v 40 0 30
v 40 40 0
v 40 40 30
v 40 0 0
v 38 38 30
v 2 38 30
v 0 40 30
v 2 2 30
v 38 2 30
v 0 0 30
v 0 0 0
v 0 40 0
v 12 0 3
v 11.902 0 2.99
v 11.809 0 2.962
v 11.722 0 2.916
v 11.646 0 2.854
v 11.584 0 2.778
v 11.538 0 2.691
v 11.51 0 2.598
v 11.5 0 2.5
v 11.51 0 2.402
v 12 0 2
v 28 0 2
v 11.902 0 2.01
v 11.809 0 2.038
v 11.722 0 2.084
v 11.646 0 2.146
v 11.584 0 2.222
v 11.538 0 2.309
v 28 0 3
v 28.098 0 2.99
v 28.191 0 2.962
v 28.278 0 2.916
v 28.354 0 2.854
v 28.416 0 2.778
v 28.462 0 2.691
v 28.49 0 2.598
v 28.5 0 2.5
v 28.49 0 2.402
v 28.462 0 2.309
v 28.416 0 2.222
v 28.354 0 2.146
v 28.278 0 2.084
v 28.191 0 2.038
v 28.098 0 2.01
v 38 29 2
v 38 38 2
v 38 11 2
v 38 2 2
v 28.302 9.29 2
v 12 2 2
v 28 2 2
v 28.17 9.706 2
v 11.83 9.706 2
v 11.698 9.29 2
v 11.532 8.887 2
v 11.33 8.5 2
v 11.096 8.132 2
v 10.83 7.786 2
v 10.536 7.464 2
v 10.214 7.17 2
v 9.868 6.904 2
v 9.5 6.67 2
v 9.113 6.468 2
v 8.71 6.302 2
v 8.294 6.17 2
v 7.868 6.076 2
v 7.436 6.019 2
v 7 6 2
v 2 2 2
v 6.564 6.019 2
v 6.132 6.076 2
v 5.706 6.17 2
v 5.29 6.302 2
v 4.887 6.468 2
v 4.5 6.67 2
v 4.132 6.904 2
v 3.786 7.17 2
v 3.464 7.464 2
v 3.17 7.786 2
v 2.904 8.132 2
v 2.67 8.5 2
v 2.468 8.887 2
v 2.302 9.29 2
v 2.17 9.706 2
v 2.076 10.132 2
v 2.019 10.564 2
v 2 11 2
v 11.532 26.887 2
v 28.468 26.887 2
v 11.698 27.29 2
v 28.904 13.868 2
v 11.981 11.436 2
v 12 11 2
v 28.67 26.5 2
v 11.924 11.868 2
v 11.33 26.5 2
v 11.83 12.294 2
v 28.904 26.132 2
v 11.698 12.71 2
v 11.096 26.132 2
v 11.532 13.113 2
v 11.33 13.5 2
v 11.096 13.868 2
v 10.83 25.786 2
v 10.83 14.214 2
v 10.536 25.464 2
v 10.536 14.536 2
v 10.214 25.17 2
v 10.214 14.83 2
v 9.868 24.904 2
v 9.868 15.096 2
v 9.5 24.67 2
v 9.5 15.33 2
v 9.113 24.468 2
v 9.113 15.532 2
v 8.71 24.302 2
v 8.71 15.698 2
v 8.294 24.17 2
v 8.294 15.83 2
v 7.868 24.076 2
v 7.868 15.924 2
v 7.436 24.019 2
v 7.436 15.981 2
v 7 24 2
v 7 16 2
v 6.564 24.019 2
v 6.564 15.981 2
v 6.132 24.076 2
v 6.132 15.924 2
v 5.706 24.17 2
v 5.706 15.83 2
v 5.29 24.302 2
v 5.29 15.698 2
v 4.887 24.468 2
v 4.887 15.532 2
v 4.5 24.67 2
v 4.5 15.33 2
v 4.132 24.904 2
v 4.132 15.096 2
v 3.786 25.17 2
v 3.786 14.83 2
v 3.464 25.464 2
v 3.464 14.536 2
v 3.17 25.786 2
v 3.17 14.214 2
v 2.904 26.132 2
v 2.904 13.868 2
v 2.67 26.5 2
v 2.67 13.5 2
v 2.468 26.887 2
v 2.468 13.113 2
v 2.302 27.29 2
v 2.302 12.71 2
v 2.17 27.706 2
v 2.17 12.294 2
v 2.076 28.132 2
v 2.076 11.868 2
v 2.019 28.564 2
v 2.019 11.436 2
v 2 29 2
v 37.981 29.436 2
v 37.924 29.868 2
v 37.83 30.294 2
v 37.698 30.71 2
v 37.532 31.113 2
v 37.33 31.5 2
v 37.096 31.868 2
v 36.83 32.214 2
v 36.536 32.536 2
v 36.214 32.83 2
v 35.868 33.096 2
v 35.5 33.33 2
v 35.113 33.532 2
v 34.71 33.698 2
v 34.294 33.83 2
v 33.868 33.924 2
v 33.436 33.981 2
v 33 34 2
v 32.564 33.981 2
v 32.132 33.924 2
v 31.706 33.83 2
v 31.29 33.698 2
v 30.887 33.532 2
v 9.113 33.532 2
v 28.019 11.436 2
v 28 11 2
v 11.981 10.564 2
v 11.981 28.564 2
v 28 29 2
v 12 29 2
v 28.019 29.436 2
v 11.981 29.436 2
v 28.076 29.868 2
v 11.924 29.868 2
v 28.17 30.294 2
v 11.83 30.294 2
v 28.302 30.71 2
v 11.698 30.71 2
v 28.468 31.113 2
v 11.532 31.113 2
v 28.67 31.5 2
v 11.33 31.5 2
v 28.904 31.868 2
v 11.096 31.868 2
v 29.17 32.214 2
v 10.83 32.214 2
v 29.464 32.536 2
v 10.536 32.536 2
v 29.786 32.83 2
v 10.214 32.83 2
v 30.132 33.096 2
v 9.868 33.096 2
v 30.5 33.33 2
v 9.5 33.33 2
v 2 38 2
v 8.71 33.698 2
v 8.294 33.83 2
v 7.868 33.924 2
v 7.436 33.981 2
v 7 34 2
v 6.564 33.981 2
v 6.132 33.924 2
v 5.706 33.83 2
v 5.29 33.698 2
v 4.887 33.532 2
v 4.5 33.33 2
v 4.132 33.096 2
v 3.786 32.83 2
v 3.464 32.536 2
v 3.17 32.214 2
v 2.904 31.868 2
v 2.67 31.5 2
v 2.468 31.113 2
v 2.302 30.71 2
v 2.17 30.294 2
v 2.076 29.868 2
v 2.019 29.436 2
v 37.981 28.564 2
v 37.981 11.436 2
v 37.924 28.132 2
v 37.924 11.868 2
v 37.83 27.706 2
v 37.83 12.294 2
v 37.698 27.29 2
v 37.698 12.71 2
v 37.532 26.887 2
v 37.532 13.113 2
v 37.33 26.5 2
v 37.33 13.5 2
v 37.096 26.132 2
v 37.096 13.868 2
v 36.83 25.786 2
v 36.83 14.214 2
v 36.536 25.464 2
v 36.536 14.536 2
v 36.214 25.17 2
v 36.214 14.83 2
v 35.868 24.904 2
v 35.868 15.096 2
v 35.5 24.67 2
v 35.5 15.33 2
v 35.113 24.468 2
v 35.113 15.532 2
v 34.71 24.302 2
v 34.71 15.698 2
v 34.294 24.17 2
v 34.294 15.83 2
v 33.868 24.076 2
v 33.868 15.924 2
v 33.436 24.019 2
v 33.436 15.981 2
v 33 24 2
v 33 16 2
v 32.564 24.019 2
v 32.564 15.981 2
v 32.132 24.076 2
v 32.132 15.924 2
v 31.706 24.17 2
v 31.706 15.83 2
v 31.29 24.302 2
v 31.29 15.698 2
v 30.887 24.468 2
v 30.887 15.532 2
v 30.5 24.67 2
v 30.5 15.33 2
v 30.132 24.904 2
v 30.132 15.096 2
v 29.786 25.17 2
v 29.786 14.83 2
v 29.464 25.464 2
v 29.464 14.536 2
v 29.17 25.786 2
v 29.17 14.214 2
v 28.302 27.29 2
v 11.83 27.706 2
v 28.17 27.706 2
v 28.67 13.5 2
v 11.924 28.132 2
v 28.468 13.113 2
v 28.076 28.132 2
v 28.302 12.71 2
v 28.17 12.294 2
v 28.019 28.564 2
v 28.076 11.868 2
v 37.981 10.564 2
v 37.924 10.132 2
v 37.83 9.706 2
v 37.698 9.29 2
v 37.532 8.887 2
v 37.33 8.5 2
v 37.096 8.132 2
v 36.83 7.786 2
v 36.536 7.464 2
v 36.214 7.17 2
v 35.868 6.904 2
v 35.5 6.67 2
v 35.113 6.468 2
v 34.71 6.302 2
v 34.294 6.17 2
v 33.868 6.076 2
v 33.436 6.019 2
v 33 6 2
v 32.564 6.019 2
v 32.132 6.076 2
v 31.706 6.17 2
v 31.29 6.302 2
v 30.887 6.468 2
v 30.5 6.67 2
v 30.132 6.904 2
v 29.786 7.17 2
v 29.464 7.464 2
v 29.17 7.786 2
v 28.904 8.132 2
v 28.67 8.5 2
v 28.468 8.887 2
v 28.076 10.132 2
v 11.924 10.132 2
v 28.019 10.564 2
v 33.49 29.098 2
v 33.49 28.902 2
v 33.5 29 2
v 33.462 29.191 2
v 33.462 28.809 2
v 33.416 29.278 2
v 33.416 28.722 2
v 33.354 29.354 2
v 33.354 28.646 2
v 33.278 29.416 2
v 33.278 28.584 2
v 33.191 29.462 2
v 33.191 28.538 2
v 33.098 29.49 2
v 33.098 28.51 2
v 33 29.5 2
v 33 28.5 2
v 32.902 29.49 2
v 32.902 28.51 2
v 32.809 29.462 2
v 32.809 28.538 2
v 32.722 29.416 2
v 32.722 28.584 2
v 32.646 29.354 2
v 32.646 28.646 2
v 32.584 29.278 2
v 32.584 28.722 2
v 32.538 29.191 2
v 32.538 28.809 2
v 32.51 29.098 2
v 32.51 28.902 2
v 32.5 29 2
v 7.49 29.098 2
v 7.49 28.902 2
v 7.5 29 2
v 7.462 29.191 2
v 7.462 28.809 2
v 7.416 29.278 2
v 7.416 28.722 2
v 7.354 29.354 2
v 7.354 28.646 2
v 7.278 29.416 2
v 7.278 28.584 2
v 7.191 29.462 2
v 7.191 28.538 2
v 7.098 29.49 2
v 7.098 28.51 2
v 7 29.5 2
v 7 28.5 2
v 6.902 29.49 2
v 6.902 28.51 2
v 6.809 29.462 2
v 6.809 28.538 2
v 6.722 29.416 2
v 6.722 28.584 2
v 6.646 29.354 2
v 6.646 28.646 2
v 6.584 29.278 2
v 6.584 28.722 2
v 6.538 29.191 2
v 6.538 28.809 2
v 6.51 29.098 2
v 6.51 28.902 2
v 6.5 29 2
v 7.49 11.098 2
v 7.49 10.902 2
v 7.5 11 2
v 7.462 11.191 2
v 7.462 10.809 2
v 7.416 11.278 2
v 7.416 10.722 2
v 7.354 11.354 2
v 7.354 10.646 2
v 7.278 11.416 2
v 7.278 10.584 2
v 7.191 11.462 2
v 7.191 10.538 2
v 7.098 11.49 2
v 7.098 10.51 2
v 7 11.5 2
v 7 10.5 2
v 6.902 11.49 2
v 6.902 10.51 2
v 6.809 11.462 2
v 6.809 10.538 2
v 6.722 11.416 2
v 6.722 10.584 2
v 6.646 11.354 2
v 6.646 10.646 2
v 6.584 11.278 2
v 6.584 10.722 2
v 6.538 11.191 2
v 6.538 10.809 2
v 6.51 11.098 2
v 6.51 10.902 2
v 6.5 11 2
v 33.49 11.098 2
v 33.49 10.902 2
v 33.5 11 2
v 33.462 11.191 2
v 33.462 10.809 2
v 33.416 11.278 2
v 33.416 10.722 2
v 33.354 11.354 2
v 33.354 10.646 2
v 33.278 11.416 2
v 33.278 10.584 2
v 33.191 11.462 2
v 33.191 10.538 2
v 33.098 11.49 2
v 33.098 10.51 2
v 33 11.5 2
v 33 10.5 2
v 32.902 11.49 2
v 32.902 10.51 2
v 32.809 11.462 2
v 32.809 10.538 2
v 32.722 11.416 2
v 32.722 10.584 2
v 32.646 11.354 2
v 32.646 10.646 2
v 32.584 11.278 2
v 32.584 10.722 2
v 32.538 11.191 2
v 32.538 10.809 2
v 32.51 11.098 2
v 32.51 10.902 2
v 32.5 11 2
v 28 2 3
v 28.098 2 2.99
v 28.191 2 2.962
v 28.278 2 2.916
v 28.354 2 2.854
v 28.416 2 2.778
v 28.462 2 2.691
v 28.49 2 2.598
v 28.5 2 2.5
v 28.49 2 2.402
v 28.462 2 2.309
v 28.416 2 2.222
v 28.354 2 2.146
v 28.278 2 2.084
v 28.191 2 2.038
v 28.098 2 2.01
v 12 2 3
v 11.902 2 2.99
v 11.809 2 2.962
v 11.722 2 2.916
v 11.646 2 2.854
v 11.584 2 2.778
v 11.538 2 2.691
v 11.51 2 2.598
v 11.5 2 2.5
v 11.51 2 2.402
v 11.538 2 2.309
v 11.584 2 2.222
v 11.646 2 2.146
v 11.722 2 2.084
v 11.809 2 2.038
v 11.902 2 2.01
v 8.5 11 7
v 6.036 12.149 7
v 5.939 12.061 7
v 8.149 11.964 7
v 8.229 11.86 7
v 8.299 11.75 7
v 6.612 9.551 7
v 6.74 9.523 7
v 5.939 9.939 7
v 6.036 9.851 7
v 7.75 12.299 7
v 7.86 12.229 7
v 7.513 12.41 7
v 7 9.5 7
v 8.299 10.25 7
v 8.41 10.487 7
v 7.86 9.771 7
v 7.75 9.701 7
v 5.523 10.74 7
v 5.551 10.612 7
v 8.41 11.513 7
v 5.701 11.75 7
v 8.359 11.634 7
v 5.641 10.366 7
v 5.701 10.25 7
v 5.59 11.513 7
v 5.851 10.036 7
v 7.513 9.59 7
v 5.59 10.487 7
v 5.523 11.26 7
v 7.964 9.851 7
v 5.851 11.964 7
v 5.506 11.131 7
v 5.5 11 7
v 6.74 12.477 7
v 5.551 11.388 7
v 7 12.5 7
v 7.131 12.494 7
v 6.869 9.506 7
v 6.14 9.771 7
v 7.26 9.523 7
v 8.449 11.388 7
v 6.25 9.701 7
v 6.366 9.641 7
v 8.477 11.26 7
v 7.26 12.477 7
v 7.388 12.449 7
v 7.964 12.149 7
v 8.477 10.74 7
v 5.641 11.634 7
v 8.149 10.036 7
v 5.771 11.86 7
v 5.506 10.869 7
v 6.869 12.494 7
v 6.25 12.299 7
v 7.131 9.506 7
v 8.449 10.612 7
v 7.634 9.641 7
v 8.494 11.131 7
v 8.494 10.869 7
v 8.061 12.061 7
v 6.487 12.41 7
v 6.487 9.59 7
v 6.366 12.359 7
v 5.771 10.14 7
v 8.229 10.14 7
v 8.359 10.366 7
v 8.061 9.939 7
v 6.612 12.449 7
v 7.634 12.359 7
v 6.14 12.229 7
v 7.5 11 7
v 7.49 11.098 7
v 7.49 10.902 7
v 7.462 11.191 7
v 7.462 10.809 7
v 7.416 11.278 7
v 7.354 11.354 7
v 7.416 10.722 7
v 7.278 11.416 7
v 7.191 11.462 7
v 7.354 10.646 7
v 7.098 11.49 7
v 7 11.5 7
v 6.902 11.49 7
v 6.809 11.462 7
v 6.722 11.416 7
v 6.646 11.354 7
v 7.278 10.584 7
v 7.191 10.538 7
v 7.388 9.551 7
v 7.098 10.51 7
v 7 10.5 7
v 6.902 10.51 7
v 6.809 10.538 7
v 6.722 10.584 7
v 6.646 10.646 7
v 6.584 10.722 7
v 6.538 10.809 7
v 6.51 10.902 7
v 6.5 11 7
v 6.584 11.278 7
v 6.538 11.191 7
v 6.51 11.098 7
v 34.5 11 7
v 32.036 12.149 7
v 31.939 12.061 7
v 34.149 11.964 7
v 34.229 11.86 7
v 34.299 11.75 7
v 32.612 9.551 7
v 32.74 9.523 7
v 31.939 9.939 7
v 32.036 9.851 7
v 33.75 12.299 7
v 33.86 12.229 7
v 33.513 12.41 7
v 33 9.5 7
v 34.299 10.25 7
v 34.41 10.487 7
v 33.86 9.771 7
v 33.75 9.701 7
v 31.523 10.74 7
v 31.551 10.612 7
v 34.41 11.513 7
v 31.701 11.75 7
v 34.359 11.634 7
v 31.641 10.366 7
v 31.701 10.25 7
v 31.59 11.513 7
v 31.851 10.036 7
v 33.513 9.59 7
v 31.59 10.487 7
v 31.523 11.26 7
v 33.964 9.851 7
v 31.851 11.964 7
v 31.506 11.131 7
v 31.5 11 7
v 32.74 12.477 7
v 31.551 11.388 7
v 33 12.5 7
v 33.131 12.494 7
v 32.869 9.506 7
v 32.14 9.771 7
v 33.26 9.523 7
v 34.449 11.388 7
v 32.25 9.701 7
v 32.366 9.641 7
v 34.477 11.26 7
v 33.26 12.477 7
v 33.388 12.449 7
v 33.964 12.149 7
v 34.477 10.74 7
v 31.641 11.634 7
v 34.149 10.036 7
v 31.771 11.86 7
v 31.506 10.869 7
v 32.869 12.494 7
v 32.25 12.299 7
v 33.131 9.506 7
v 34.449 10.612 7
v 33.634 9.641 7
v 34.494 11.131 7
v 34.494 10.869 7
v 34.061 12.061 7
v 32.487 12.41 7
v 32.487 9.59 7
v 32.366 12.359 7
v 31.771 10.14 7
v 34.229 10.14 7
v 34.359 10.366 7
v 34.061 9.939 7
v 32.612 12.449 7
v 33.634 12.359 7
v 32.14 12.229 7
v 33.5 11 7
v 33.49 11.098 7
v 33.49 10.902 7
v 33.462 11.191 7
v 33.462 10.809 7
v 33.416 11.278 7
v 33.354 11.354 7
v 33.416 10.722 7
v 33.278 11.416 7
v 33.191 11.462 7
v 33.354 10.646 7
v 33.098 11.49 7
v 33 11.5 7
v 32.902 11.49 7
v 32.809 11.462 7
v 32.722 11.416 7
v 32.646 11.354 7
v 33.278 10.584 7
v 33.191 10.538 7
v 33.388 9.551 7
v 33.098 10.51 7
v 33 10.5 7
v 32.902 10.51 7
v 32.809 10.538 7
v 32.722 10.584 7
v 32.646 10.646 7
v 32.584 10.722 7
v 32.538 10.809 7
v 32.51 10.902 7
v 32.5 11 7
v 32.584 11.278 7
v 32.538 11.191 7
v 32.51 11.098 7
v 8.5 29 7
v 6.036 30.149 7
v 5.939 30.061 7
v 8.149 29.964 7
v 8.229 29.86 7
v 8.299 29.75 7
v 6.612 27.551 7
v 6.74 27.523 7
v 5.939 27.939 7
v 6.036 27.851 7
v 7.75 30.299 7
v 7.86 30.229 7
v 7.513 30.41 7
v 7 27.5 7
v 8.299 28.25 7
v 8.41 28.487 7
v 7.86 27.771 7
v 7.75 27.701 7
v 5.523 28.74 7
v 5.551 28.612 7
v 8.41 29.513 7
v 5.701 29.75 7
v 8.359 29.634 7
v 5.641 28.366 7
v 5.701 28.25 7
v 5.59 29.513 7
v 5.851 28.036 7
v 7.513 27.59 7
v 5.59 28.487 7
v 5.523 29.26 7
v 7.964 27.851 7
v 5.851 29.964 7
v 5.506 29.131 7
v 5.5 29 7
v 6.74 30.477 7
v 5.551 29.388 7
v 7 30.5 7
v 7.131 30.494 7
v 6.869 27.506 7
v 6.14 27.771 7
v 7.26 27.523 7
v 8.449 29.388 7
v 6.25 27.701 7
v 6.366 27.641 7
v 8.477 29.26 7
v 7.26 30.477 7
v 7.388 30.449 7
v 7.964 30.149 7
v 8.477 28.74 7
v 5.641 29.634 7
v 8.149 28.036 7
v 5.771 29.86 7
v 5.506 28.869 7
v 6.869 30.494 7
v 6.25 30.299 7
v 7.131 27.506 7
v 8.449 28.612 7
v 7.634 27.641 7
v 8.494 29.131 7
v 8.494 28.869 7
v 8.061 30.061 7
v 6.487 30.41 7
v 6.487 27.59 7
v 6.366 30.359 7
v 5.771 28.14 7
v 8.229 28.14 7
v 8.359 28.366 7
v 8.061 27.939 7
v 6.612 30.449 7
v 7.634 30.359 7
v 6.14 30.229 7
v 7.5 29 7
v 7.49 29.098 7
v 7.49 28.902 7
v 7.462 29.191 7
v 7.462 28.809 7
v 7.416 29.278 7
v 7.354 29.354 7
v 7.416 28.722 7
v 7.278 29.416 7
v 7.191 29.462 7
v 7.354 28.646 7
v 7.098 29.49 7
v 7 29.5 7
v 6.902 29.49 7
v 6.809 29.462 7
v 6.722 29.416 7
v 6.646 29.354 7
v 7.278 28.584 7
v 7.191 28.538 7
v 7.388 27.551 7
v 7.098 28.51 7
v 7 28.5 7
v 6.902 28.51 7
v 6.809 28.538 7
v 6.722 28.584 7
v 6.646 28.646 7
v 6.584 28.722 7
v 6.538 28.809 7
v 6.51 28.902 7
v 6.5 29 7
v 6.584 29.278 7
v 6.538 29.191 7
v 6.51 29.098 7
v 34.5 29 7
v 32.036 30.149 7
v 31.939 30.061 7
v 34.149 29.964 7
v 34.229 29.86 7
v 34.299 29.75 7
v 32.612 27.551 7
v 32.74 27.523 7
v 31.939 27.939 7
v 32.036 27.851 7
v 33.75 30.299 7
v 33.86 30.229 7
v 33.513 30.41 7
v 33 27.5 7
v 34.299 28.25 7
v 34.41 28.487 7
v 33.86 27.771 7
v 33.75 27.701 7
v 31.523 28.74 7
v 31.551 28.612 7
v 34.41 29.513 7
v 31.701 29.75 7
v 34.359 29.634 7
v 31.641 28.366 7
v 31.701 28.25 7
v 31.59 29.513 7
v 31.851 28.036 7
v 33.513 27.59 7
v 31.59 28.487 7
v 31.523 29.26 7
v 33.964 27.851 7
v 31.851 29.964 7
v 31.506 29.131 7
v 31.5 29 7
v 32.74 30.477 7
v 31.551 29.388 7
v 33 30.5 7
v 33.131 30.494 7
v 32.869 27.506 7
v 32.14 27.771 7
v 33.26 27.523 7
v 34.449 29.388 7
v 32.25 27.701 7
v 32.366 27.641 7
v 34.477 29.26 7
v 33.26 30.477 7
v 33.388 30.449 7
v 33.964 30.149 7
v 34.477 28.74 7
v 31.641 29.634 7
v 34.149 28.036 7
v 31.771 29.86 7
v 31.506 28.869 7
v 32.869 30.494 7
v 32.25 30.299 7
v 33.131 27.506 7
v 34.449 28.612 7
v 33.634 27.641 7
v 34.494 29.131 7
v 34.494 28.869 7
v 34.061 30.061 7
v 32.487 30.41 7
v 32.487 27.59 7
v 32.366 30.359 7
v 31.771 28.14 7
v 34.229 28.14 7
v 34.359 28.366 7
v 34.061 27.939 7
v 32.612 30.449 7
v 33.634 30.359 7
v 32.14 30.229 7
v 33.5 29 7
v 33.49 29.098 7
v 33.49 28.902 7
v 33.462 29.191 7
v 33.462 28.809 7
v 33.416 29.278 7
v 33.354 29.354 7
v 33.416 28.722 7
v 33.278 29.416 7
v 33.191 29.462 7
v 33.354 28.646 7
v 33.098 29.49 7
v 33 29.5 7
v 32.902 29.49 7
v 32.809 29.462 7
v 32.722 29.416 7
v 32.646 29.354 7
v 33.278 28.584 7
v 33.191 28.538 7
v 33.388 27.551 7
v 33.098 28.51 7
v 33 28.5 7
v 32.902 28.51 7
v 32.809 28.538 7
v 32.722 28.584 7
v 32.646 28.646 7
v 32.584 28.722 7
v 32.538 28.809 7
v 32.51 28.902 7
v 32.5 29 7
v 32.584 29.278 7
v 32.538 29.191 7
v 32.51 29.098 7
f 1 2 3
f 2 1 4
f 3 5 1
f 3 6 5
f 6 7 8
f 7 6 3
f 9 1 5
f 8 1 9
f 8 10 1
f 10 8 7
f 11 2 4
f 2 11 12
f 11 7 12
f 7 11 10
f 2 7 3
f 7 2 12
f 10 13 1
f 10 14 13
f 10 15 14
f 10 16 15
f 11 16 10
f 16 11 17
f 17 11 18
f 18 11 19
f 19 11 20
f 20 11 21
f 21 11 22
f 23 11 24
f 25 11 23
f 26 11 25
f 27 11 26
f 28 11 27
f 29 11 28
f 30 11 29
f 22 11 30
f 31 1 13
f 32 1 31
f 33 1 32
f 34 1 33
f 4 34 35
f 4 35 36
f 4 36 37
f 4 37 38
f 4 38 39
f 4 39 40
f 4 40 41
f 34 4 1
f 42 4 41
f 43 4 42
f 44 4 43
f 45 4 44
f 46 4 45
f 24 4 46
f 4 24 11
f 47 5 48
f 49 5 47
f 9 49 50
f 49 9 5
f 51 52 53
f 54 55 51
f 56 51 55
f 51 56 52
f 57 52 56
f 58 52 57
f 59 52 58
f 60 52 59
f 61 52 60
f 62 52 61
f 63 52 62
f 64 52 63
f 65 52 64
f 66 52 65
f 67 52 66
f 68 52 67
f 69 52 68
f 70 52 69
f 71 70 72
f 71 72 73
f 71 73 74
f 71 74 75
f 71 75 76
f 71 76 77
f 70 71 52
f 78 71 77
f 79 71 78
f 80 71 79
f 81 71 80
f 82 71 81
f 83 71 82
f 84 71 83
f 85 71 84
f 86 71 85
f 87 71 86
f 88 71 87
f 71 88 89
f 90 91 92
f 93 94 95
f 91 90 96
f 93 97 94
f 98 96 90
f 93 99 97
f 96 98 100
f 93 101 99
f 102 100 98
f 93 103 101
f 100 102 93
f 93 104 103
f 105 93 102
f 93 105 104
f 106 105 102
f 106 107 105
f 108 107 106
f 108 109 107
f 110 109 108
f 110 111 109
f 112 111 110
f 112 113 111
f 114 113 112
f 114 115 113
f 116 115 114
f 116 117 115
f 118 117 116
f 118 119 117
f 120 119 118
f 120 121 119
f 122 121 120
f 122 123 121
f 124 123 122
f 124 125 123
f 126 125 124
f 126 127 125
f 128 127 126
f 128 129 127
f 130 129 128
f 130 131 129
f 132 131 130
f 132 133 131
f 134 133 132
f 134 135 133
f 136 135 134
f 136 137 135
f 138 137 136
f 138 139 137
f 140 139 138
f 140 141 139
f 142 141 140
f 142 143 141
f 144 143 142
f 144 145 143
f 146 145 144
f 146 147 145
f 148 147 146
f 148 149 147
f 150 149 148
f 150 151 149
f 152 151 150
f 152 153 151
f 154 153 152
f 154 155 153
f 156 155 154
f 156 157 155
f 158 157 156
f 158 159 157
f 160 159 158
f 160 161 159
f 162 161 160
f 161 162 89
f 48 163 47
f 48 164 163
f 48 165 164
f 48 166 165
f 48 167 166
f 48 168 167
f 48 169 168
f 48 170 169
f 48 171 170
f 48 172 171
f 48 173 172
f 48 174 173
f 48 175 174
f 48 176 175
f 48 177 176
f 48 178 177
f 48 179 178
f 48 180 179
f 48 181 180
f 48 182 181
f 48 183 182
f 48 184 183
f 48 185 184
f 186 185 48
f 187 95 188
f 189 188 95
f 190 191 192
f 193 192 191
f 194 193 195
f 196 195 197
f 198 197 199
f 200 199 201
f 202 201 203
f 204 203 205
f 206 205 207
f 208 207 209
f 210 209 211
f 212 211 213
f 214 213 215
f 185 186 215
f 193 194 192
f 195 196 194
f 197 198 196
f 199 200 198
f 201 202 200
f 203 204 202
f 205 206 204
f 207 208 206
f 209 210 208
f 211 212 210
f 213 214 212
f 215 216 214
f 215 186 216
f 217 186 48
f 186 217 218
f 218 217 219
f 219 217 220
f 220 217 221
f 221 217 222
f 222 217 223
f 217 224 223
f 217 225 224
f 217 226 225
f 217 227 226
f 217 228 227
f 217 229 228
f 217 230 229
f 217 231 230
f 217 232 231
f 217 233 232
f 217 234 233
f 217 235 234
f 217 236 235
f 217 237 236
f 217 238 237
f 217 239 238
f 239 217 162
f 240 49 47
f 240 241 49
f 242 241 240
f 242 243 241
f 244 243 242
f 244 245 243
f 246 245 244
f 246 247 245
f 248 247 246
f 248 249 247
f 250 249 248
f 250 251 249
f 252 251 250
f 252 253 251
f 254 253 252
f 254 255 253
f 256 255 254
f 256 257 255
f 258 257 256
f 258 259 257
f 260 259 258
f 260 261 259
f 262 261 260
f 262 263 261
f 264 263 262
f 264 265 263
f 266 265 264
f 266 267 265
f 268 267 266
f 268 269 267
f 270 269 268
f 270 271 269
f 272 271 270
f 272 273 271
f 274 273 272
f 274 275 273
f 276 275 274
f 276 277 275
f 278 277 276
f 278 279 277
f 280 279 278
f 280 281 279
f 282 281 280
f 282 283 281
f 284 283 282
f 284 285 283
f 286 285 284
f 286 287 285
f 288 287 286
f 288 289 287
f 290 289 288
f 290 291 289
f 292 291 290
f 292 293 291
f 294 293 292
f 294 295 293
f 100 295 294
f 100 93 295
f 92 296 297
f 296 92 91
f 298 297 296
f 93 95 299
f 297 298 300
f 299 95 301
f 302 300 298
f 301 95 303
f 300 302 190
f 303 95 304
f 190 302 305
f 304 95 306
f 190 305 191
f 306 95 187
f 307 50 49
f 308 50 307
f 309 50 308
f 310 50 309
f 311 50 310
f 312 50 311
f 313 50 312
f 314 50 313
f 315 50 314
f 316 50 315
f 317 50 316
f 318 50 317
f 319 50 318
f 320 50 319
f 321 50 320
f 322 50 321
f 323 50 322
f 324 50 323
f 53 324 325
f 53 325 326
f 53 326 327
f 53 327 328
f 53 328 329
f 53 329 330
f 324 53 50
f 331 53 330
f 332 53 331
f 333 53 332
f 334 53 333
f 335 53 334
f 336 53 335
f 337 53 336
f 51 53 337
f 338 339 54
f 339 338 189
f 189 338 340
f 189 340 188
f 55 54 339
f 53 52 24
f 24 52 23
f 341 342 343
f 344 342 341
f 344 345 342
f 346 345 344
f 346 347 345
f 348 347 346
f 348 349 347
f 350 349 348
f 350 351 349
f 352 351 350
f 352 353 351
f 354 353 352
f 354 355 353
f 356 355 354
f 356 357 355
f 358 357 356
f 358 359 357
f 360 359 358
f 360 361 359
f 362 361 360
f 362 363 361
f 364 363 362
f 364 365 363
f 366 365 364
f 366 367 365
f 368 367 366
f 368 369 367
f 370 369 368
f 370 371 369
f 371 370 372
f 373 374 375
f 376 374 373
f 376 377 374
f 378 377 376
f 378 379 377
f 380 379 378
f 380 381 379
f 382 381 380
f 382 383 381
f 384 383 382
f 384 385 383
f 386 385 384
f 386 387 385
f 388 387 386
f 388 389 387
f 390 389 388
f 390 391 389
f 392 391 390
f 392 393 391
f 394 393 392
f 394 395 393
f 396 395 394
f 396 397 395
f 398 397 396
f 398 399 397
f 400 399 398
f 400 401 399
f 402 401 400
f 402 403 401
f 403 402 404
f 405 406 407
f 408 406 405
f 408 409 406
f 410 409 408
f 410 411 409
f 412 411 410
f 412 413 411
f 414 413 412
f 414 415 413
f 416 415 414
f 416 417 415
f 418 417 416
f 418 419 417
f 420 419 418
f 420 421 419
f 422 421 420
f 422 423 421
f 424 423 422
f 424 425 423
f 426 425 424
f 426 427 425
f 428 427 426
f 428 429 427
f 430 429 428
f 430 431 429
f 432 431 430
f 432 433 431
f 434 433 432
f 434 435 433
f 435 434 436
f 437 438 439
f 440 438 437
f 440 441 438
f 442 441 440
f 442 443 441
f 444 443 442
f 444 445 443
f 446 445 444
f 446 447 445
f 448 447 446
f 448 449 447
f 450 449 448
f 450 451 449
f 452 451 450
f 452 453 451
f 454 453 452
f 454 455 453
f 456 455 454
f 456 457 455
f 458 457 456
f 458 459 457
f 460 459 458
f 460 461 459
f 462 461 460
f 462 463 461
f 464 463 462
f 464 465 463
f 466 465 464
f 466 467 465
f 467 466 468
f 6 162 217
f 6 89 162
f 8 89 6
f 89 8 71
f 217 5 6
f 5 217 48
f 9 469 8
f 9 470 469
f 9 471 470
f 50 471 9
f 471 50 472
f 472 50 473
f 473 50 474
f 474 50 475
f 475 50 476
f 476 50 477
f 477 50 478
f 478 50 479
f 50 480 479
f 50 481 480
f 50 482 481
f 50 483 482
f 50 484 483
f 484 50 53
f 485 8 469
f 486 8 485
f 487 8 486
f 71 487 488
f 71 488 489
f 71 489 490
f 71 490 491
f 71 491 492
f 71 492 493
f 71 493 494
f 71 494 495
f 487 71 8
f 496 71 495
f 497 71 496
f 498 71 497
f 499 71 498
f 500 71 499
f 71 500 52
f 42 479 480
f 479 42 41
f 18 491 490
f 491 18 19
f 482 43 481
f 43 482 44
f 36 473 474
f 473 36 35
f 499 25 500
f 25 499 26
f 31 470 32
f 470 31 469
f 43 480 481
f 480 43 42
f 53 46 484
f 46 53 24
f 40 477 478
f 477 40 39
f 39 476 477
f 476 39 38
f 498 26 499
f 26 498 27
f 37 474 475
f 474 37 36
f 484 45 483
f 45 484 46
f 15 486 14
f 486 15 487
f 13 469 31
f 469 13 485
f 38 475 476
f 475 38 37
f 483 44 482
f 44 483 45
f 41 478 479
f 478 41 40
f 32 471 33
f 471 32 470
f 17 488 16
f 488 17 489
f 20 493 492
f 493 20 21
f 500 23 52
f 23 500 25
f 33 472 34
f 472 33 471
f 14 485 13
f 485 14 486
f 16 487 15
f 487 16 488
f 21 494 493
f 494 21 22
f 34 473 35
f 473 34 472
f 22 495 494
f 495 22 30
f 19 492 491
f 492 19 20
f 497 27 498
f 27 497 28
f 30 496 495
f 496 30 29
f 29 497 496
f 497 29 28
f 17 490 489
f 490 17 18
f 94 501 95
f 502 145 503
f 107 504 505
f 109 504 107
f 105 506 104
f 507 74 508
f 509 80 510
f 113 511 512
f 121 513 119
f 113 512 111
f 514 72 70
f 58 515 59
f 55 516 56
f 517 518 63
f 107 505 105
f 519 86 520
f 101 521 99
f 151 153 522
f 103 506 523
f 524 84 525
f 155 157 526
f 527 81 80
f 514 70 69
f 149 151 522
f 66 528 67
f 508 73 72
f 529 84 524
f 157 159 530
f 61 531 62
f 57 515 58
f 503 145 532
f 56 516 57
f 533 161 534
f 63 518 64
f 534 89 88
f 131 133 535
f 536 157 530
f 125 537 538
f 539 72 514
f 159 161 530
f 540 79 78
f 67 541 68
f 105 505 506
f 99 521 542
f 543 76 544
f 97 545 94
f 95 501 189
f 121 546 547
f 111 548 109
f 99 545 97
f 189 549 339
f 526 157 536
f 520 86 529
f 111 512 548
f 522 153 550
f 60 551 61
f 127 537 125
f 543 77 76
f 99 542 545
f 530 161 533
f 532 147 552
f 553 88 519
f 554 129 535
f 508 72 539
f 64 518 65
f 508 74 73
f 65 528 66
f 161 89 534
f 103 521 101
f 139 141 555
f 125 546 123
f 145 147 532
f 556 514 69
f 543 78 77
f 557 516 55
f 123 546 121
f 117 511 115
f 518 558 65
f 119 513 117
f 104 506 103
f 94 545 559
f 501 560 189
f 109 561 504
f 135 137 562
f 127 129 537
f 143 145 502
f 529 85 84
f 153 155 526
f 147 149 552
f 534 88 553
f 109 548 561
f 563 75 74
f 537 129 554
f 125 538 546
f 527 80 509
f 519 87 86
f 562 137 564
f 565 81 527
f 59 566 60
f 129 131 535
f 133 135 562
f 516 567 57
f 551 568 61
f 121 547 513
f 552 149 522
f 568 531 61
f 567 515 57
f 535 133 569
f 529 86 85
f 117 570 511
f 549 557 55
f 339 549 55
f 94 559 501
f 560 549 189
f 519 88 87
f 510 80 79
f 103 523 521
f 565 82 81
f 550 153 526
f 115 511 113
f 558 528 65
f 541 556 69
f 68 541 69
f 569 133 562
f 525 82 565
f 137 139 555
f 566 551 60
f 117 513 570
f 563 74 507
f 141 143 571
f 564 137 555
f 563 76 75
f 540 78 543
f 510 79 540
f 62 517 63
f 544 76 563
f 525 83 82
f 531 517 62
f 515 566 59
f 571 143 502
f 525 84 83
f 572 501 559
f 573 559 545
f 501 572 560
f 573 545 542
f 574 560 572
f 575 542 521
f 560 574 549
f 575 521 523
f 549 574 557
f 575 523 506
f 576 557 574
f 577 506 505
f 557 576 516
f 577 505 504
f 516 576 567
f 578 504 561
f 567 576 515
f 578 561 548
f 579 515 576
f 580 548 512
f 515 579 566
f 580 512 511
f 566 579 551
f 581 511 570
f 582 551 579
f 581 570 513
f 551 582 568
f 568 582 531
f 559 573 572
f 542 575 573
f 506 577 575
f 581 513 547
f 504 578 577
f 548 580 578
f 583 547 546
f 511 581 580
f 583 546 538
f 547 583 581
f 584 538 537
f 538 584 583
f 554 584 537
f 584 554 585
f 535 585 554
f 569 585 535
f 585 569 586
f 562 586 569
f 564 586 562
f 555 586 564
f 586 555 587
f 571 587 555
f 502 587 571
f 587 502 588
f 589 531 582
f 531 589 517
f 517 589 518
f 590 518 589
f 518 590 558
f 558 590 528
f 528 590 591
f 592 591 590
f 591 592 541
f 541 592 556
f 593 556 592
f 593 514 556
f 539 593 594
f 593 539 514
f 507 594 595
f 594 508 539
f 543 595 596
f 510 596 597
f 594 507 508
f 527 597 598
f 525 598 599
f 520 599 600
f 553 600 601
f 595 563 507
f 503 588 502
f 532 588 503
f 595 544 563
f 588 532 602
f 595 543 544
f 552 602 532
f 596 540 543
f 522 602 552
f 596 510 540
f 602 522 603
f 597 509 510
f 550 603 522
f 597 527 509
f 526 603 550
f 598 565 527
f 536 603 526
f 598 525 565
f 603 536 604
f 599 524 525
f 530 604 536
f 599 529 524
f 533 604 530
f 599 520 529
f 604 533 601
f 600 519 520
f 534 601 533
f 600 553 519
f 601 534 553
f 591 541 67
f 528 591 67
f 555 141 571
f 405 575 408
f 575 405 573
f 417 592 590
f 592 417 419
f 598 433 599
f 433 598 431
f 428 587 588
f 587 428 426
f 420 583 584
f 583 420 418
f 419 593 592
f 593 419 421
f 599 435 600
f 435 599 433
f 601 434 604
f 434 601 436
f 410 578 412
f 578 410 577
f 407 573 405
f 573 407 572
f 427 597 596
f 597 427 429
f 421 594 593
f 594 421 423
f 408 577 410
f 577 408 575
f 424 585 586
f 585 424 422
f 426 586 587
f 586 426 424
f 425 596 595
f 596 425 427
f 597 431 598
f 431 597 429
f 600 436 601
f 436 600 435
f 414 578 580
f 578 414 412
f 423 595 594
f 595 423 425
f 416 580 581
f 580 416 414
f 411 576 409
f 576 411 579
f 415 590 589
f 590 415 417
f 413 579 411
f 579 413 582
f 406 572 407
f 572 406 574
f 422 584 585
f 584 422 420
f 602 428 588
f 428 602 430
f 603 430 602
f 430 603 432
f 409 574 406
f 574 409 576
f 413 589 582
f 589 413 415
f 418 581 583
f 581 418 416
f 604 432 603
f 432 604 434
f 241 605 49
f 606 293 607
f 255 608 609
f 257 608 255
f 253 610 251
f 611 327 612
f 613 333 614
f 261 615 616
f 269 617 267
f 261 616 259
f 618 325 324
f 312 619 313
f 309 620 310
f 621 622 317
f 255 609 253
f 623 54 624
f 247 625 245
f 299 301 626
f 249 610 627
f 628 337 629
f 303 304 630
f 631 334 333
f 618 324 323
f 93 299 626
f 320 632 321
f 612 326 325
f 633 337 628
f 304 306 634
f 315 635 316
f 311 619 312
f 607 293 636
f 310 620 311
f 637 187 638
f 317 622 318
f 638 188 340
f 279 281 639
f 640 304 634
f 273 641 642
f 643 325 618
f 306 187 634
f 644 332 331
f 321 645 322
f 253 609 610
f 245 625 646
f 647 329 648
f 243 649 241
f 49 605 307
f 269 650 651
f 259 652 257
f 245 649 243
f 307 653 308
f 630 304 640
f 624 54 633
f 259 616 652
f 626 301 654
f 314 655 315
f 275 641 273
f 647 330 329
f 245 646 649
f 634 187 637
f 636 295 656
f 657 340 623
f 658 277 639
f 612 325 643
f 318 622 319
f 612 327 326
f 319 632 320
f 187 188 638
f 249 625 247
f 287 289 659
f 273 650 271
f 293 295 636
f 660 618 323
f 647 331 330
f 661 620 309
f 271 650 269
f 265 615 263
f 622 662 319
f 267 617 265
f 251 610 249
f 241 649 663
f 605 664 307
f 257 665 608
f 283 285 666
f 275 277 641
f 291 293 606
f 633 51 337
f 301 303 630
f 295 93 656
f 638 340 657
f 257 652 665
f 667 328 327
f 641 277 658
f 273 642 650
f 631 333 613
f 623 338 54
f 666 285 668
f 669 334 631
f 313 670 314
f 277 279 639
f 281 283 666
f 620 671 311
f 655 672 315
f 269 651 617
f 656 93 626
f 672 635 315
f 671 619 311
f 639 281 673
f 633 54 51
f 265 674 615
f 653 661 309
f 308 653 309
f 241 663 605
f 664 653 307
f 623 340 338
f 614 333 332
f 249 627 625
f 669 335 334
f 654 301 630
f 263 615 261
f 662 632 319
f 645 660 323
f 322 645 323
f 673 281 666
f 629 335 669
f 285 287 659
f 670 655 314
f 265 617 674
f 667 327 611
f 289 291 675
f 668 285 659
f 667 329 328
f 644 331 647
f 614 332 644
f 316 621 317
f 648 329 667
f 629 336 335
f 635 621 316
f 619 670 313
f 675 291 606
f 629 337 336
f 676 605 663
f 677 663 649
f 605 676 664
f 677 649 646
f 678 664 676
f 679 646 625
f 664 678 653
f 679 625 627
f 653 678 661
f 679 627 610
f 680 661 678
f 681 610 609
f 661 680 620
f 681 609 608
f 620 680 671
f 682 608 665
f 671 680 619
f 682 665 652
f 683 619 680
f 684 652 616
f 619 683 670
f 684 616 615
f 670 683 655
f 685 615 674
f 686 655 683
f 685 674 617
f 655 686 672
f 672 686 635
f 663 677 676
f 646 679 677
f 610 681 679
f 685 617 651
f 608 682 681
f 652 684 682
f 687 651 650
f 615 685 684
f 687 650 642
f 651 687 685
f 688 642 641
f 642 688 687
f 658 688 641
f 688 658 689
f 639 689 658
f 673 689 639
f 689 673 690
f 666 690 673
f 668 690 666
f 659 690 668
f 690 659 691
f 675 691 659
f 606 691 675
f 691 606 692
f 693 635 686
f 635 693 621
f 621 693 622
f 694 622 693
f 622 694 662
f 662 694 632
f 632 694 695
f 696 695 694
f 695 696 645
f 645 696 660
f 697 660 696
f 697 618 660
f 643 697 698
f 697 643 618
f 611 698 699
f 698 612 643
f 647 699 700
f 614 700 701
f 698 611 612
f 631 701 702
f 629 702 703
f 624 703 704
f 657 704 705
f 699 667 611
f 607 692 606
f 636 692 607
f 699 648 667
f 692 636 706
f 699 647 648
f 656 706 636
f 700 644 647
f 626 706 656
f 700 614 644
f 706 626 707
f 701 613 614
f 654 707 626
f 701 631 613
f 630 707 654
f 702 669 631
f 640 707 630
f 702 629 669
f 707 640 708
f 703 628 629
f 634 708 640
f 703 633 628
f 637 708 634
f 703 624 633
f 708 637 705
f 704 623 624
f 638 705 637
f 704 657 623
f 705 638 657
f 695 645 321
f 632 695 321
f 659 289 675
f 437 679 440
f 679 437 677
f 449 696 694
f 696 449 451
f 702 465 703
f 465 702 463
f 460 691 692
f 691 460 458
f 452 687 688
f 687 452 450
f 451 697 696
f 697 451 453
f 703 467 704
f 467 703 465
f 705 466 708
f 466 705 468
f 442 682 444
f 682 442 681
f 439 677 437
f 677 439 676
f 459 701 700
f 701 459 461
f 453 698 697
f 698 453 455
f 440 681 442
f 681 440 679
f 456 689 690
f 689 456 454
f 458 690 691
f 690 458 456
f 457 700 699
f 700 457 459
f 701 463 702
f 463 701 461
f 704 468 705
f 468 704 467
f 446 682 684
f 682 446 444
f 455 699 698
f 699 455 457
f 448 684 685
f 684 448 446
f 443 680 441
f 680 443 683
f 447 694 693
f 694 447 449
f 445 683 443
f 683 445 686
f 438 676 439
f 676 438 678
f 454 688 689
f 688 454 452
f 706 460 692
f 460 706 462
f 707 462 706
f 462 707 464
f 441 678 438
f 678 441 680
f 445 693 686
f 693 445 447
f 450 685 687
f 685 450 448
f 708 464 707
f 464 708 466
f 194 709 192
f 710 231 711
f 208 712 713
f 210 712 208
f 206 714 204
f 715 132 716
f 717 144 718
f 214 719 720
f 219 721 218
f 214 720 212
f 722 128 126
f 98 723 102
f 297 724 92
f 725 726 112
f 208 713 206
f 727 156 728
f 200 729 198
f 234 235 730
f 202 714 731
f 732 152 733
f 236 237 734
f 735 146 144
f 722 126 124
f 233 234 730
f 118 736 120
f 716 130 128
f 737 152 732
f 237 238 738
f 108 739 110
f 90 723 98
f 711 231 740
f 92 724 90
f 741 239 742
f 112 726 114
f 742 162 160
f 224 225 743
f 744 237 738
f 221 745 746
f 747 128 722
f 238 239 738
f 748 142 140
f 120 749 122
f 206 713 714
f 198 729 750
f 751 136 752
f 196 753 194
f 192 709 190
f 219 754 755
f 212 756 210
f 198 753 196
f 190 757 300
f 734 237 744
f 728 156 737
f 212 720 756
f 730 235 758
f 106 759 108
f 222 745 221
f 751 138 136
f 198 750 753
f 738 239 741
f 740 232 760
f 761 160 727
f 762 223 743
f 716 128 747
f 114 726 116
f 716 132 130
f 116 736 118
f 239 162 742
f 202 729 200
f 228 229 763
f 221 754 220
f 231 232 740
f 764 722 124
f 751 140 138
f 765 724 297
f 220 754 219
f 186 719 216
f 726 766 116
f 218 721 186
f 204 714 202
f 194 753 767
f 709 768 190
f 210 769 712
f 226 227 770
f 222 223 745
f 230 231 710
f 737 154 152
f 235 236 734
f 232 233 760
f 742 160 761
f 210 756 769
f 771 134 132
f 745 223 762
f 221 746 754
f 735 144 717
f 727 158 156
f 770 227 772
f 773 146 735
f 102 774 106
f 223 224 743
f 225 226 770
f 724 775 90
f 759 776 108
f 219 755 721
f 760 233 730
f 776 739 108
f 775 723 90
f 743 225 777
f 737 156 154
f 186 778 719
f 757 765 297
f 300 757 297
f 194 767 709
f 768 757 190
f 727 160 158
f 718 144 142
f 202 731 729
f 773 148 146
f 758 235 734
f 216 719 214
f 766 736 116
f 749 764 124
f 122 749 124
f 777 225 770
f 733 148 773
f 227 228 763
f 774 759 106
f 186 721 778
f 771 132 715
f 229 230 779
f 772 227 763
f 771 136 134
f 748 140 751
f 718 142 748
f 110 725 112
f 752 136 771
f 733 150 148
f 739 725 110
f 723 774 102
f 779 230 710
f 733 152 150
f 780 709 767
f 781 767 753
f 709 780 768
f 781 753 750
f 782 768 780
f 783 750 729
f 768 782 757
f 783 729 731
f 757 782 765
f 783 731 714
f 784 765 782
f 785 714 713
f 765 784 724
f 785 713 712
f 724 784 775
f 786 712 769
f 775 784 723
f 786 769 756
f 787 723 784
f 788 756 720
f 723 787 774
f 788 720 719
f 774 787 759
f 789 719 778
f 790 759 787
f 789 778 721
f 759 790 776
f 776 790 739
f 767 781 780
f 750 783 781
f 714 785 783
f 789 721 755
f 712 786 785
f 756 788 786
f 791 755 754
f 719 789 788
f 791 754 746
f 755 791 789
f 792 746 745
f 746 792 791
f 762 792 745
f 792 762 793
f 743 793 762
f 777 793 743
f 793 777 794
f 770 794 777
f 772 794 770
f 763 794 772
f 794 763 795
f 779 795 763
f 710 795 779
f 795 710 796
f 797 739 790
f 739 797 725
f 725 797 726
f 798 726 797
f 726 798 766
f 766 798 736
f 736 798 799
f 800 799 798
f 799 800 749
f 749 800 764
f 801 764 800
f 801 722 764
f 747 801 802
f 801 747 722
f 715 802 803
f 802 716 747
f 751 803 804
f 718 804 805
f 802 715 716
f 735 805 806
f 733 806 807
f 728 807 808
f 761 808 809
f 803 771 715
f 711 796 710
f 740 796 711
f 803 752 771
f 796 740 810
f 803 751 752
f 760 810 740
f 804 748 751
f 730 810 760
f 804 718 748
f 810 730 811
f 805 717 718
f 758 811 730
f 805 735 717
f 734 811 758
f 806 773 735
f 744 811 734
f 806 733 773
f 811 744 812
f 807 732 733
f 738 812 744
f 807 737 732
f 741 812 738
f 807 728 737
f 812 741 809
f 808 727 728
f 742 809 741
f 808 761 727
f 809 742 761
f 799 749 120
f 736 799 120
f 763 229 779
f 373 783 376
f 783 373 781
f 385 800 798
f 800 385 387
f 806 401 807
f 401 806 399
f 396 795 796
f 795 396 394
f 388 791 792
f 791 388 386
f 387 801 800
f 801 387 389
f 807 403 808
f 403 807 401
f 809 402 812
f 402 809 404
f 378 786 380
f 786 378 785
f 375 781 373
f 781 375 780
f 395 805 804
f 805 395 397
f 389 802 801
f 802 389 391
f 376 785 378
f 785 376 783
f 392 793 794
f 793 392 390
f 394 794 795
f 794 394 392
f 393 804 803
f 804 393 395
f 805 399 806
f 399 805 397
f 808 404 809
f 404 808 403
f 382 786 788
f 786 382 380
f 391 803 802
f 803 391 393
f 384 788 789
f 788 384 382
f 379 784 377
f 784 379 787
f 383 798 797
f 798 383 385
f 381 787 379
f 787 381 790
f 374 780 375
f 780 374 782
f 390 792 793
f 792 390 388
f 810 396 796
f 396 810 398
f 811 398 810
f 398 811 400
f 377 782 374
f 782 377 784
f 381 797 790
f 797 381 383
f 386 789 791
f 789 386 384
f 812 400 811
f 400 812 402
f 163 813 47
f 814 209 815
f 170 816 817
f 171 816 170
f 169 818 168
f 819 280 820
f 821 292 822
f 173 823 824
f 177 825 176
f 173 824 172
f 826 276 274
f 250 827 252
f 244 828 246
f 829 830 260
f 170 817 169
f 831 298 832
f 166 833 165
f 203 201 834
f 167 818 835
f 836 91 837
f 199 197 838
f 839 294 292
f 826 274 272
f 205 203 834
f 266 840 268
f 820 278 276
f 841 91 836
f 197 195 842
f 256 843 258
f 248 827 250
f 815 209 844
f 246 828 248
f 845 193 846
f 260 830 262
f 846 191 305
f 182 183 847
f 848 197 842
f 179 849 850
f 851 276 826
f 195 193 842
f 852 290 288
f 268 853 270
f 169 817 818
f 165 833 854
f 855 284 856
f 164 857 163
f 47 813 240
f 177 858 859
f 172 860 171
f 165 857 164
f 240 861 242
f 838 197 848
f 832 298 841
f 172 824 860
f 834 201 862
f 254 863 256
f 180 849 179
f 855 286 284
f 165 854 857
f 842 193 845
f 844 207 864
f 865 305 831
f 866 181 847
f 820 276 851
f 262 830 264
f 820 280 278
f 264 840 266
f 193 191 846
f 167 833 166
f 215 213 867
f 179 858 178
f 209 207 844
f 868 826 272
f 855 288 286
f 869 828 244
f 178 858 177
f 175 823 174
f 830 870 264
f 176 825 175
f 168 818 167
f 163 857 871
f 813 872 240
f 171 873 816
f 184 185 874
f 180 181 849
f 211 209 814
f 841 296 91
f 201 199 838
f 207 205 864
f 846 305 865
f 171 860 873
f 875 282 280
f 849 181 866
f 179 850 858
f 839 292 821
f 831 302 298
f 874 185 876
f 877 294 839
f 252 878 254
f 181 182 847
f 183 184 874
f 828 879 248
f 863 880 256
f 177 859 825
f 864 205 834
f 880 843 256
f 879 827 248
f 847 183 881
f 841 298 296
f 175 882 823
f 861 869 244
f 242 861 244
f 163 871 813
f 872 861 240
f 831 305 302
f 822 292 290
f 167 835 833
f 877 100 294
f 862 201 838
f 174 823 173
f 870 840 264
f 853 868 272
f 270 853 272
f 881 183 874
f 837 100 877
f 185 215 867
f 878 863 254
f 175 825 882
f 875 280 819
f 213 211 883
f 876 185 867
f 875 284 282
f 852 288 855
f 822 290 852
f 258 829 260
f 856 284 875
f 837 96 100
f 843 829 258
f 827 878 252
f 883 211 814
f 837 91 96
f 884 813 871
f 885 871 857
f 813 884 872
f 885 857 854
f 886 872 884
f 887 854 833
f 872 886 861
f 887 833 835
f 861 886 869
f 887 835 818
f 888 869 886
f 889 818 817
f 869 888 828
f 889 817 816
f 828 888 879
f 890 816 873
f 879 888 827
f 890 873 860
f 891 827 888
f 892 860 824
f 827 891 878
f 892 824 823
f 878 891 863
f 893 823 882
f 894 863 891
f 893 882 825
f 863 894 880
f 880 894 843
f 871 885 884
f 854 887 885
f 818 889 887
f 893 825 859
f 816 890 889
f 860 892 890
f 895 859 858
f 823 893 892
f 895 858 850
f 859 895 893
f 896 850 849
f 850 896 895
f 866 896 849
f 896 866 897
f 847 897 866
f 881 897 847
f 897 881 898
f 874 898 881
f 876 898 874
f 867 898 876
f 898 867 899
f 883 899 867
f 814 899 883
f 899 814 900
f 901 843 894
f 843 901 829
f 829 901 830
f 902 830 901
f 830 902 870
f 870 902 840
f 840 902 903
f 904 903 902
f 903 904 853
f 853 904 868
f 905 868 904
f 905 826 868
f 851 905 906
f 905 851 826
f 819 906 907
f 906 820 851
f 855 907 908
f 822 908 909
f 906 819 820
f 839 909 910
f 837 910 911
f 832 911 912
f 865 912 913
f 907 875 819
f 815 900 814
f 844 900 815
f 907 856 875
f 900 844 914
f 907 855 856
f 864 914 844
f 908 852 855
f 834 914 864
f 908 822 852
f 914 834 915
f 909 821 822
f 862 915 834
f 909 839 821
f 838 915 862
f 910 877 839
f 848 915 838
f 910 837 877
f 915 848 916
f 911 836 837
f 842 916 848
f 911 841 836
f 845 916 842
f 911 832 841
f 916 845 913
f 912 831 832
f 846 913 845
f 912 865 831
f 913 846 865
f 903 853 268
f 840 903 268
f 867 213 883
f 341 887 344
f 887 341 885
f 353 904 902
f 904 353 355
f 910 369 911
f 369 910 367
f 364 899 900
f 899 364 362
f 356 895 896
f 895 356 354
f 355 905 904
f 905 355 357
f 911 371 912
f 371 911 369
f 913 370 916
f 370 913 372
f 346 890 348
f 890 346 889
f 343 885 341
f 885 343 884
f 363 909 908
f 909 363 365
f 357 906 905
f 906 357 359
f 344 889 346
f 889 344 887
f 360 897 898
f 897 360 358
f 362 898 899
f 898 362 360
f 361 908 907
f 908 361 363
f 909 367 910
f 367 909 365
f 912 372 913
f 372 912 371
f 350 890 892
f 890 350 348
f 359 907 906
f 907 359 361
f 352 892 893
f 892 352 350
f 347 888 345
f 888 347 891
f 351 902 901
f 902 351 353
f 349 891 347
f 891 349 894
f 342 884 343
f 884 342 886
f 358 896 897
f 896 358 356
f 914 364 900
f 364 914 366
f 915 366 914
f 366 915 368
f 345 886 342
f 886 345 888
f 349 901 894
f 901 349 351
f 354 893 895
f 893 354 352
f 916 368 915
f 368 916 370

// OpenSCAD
// Global resolution
$fs = 0.1;  // Don't generate smaller facets than 0.1 mm
$fa = 5;    // Don't generate larger angles than 5 degrees

width = 40;
height = 40;
depth = 30;
wall = 2;

cable_width = 16;
cable_height = 1;

support_width=26;
support_height=18;


support_origin = [(width - support_width) / 2, (height - support_height) / 2, wall];


module cable() {
    translate([(width-cable_width)/2, 2*wall, wall+cable_height/2])
        rotate([90,0,0]) {
            hull() {
                cylinder(d=cable_height, h=100);
                translate([cable_width,0,0]) cylinder(d=cable_height, h=100);
            }
        }
}

module house() {
    difference() {
        cube([width, height, depth]);
        translate([wall,wall,wall]) cube([width-2*wall, height-2*wall, depth]);
        cable();
    }
}

module support() {
    difference() {
        cylinder(d1=10,d2=3,h=5);
        cylinder(d=1,h=6);
    }
}

//translate([50,0,0])
union() {
    house();
    translate(support_origin) support();
    translate(support_origin + [support_width, 0, 0]) support();
    translate(support_origin + [0, support_height, 0]) support();
    translate(support_origin + [support_width, support_height, 0]) support();
}

echo(version=version());
